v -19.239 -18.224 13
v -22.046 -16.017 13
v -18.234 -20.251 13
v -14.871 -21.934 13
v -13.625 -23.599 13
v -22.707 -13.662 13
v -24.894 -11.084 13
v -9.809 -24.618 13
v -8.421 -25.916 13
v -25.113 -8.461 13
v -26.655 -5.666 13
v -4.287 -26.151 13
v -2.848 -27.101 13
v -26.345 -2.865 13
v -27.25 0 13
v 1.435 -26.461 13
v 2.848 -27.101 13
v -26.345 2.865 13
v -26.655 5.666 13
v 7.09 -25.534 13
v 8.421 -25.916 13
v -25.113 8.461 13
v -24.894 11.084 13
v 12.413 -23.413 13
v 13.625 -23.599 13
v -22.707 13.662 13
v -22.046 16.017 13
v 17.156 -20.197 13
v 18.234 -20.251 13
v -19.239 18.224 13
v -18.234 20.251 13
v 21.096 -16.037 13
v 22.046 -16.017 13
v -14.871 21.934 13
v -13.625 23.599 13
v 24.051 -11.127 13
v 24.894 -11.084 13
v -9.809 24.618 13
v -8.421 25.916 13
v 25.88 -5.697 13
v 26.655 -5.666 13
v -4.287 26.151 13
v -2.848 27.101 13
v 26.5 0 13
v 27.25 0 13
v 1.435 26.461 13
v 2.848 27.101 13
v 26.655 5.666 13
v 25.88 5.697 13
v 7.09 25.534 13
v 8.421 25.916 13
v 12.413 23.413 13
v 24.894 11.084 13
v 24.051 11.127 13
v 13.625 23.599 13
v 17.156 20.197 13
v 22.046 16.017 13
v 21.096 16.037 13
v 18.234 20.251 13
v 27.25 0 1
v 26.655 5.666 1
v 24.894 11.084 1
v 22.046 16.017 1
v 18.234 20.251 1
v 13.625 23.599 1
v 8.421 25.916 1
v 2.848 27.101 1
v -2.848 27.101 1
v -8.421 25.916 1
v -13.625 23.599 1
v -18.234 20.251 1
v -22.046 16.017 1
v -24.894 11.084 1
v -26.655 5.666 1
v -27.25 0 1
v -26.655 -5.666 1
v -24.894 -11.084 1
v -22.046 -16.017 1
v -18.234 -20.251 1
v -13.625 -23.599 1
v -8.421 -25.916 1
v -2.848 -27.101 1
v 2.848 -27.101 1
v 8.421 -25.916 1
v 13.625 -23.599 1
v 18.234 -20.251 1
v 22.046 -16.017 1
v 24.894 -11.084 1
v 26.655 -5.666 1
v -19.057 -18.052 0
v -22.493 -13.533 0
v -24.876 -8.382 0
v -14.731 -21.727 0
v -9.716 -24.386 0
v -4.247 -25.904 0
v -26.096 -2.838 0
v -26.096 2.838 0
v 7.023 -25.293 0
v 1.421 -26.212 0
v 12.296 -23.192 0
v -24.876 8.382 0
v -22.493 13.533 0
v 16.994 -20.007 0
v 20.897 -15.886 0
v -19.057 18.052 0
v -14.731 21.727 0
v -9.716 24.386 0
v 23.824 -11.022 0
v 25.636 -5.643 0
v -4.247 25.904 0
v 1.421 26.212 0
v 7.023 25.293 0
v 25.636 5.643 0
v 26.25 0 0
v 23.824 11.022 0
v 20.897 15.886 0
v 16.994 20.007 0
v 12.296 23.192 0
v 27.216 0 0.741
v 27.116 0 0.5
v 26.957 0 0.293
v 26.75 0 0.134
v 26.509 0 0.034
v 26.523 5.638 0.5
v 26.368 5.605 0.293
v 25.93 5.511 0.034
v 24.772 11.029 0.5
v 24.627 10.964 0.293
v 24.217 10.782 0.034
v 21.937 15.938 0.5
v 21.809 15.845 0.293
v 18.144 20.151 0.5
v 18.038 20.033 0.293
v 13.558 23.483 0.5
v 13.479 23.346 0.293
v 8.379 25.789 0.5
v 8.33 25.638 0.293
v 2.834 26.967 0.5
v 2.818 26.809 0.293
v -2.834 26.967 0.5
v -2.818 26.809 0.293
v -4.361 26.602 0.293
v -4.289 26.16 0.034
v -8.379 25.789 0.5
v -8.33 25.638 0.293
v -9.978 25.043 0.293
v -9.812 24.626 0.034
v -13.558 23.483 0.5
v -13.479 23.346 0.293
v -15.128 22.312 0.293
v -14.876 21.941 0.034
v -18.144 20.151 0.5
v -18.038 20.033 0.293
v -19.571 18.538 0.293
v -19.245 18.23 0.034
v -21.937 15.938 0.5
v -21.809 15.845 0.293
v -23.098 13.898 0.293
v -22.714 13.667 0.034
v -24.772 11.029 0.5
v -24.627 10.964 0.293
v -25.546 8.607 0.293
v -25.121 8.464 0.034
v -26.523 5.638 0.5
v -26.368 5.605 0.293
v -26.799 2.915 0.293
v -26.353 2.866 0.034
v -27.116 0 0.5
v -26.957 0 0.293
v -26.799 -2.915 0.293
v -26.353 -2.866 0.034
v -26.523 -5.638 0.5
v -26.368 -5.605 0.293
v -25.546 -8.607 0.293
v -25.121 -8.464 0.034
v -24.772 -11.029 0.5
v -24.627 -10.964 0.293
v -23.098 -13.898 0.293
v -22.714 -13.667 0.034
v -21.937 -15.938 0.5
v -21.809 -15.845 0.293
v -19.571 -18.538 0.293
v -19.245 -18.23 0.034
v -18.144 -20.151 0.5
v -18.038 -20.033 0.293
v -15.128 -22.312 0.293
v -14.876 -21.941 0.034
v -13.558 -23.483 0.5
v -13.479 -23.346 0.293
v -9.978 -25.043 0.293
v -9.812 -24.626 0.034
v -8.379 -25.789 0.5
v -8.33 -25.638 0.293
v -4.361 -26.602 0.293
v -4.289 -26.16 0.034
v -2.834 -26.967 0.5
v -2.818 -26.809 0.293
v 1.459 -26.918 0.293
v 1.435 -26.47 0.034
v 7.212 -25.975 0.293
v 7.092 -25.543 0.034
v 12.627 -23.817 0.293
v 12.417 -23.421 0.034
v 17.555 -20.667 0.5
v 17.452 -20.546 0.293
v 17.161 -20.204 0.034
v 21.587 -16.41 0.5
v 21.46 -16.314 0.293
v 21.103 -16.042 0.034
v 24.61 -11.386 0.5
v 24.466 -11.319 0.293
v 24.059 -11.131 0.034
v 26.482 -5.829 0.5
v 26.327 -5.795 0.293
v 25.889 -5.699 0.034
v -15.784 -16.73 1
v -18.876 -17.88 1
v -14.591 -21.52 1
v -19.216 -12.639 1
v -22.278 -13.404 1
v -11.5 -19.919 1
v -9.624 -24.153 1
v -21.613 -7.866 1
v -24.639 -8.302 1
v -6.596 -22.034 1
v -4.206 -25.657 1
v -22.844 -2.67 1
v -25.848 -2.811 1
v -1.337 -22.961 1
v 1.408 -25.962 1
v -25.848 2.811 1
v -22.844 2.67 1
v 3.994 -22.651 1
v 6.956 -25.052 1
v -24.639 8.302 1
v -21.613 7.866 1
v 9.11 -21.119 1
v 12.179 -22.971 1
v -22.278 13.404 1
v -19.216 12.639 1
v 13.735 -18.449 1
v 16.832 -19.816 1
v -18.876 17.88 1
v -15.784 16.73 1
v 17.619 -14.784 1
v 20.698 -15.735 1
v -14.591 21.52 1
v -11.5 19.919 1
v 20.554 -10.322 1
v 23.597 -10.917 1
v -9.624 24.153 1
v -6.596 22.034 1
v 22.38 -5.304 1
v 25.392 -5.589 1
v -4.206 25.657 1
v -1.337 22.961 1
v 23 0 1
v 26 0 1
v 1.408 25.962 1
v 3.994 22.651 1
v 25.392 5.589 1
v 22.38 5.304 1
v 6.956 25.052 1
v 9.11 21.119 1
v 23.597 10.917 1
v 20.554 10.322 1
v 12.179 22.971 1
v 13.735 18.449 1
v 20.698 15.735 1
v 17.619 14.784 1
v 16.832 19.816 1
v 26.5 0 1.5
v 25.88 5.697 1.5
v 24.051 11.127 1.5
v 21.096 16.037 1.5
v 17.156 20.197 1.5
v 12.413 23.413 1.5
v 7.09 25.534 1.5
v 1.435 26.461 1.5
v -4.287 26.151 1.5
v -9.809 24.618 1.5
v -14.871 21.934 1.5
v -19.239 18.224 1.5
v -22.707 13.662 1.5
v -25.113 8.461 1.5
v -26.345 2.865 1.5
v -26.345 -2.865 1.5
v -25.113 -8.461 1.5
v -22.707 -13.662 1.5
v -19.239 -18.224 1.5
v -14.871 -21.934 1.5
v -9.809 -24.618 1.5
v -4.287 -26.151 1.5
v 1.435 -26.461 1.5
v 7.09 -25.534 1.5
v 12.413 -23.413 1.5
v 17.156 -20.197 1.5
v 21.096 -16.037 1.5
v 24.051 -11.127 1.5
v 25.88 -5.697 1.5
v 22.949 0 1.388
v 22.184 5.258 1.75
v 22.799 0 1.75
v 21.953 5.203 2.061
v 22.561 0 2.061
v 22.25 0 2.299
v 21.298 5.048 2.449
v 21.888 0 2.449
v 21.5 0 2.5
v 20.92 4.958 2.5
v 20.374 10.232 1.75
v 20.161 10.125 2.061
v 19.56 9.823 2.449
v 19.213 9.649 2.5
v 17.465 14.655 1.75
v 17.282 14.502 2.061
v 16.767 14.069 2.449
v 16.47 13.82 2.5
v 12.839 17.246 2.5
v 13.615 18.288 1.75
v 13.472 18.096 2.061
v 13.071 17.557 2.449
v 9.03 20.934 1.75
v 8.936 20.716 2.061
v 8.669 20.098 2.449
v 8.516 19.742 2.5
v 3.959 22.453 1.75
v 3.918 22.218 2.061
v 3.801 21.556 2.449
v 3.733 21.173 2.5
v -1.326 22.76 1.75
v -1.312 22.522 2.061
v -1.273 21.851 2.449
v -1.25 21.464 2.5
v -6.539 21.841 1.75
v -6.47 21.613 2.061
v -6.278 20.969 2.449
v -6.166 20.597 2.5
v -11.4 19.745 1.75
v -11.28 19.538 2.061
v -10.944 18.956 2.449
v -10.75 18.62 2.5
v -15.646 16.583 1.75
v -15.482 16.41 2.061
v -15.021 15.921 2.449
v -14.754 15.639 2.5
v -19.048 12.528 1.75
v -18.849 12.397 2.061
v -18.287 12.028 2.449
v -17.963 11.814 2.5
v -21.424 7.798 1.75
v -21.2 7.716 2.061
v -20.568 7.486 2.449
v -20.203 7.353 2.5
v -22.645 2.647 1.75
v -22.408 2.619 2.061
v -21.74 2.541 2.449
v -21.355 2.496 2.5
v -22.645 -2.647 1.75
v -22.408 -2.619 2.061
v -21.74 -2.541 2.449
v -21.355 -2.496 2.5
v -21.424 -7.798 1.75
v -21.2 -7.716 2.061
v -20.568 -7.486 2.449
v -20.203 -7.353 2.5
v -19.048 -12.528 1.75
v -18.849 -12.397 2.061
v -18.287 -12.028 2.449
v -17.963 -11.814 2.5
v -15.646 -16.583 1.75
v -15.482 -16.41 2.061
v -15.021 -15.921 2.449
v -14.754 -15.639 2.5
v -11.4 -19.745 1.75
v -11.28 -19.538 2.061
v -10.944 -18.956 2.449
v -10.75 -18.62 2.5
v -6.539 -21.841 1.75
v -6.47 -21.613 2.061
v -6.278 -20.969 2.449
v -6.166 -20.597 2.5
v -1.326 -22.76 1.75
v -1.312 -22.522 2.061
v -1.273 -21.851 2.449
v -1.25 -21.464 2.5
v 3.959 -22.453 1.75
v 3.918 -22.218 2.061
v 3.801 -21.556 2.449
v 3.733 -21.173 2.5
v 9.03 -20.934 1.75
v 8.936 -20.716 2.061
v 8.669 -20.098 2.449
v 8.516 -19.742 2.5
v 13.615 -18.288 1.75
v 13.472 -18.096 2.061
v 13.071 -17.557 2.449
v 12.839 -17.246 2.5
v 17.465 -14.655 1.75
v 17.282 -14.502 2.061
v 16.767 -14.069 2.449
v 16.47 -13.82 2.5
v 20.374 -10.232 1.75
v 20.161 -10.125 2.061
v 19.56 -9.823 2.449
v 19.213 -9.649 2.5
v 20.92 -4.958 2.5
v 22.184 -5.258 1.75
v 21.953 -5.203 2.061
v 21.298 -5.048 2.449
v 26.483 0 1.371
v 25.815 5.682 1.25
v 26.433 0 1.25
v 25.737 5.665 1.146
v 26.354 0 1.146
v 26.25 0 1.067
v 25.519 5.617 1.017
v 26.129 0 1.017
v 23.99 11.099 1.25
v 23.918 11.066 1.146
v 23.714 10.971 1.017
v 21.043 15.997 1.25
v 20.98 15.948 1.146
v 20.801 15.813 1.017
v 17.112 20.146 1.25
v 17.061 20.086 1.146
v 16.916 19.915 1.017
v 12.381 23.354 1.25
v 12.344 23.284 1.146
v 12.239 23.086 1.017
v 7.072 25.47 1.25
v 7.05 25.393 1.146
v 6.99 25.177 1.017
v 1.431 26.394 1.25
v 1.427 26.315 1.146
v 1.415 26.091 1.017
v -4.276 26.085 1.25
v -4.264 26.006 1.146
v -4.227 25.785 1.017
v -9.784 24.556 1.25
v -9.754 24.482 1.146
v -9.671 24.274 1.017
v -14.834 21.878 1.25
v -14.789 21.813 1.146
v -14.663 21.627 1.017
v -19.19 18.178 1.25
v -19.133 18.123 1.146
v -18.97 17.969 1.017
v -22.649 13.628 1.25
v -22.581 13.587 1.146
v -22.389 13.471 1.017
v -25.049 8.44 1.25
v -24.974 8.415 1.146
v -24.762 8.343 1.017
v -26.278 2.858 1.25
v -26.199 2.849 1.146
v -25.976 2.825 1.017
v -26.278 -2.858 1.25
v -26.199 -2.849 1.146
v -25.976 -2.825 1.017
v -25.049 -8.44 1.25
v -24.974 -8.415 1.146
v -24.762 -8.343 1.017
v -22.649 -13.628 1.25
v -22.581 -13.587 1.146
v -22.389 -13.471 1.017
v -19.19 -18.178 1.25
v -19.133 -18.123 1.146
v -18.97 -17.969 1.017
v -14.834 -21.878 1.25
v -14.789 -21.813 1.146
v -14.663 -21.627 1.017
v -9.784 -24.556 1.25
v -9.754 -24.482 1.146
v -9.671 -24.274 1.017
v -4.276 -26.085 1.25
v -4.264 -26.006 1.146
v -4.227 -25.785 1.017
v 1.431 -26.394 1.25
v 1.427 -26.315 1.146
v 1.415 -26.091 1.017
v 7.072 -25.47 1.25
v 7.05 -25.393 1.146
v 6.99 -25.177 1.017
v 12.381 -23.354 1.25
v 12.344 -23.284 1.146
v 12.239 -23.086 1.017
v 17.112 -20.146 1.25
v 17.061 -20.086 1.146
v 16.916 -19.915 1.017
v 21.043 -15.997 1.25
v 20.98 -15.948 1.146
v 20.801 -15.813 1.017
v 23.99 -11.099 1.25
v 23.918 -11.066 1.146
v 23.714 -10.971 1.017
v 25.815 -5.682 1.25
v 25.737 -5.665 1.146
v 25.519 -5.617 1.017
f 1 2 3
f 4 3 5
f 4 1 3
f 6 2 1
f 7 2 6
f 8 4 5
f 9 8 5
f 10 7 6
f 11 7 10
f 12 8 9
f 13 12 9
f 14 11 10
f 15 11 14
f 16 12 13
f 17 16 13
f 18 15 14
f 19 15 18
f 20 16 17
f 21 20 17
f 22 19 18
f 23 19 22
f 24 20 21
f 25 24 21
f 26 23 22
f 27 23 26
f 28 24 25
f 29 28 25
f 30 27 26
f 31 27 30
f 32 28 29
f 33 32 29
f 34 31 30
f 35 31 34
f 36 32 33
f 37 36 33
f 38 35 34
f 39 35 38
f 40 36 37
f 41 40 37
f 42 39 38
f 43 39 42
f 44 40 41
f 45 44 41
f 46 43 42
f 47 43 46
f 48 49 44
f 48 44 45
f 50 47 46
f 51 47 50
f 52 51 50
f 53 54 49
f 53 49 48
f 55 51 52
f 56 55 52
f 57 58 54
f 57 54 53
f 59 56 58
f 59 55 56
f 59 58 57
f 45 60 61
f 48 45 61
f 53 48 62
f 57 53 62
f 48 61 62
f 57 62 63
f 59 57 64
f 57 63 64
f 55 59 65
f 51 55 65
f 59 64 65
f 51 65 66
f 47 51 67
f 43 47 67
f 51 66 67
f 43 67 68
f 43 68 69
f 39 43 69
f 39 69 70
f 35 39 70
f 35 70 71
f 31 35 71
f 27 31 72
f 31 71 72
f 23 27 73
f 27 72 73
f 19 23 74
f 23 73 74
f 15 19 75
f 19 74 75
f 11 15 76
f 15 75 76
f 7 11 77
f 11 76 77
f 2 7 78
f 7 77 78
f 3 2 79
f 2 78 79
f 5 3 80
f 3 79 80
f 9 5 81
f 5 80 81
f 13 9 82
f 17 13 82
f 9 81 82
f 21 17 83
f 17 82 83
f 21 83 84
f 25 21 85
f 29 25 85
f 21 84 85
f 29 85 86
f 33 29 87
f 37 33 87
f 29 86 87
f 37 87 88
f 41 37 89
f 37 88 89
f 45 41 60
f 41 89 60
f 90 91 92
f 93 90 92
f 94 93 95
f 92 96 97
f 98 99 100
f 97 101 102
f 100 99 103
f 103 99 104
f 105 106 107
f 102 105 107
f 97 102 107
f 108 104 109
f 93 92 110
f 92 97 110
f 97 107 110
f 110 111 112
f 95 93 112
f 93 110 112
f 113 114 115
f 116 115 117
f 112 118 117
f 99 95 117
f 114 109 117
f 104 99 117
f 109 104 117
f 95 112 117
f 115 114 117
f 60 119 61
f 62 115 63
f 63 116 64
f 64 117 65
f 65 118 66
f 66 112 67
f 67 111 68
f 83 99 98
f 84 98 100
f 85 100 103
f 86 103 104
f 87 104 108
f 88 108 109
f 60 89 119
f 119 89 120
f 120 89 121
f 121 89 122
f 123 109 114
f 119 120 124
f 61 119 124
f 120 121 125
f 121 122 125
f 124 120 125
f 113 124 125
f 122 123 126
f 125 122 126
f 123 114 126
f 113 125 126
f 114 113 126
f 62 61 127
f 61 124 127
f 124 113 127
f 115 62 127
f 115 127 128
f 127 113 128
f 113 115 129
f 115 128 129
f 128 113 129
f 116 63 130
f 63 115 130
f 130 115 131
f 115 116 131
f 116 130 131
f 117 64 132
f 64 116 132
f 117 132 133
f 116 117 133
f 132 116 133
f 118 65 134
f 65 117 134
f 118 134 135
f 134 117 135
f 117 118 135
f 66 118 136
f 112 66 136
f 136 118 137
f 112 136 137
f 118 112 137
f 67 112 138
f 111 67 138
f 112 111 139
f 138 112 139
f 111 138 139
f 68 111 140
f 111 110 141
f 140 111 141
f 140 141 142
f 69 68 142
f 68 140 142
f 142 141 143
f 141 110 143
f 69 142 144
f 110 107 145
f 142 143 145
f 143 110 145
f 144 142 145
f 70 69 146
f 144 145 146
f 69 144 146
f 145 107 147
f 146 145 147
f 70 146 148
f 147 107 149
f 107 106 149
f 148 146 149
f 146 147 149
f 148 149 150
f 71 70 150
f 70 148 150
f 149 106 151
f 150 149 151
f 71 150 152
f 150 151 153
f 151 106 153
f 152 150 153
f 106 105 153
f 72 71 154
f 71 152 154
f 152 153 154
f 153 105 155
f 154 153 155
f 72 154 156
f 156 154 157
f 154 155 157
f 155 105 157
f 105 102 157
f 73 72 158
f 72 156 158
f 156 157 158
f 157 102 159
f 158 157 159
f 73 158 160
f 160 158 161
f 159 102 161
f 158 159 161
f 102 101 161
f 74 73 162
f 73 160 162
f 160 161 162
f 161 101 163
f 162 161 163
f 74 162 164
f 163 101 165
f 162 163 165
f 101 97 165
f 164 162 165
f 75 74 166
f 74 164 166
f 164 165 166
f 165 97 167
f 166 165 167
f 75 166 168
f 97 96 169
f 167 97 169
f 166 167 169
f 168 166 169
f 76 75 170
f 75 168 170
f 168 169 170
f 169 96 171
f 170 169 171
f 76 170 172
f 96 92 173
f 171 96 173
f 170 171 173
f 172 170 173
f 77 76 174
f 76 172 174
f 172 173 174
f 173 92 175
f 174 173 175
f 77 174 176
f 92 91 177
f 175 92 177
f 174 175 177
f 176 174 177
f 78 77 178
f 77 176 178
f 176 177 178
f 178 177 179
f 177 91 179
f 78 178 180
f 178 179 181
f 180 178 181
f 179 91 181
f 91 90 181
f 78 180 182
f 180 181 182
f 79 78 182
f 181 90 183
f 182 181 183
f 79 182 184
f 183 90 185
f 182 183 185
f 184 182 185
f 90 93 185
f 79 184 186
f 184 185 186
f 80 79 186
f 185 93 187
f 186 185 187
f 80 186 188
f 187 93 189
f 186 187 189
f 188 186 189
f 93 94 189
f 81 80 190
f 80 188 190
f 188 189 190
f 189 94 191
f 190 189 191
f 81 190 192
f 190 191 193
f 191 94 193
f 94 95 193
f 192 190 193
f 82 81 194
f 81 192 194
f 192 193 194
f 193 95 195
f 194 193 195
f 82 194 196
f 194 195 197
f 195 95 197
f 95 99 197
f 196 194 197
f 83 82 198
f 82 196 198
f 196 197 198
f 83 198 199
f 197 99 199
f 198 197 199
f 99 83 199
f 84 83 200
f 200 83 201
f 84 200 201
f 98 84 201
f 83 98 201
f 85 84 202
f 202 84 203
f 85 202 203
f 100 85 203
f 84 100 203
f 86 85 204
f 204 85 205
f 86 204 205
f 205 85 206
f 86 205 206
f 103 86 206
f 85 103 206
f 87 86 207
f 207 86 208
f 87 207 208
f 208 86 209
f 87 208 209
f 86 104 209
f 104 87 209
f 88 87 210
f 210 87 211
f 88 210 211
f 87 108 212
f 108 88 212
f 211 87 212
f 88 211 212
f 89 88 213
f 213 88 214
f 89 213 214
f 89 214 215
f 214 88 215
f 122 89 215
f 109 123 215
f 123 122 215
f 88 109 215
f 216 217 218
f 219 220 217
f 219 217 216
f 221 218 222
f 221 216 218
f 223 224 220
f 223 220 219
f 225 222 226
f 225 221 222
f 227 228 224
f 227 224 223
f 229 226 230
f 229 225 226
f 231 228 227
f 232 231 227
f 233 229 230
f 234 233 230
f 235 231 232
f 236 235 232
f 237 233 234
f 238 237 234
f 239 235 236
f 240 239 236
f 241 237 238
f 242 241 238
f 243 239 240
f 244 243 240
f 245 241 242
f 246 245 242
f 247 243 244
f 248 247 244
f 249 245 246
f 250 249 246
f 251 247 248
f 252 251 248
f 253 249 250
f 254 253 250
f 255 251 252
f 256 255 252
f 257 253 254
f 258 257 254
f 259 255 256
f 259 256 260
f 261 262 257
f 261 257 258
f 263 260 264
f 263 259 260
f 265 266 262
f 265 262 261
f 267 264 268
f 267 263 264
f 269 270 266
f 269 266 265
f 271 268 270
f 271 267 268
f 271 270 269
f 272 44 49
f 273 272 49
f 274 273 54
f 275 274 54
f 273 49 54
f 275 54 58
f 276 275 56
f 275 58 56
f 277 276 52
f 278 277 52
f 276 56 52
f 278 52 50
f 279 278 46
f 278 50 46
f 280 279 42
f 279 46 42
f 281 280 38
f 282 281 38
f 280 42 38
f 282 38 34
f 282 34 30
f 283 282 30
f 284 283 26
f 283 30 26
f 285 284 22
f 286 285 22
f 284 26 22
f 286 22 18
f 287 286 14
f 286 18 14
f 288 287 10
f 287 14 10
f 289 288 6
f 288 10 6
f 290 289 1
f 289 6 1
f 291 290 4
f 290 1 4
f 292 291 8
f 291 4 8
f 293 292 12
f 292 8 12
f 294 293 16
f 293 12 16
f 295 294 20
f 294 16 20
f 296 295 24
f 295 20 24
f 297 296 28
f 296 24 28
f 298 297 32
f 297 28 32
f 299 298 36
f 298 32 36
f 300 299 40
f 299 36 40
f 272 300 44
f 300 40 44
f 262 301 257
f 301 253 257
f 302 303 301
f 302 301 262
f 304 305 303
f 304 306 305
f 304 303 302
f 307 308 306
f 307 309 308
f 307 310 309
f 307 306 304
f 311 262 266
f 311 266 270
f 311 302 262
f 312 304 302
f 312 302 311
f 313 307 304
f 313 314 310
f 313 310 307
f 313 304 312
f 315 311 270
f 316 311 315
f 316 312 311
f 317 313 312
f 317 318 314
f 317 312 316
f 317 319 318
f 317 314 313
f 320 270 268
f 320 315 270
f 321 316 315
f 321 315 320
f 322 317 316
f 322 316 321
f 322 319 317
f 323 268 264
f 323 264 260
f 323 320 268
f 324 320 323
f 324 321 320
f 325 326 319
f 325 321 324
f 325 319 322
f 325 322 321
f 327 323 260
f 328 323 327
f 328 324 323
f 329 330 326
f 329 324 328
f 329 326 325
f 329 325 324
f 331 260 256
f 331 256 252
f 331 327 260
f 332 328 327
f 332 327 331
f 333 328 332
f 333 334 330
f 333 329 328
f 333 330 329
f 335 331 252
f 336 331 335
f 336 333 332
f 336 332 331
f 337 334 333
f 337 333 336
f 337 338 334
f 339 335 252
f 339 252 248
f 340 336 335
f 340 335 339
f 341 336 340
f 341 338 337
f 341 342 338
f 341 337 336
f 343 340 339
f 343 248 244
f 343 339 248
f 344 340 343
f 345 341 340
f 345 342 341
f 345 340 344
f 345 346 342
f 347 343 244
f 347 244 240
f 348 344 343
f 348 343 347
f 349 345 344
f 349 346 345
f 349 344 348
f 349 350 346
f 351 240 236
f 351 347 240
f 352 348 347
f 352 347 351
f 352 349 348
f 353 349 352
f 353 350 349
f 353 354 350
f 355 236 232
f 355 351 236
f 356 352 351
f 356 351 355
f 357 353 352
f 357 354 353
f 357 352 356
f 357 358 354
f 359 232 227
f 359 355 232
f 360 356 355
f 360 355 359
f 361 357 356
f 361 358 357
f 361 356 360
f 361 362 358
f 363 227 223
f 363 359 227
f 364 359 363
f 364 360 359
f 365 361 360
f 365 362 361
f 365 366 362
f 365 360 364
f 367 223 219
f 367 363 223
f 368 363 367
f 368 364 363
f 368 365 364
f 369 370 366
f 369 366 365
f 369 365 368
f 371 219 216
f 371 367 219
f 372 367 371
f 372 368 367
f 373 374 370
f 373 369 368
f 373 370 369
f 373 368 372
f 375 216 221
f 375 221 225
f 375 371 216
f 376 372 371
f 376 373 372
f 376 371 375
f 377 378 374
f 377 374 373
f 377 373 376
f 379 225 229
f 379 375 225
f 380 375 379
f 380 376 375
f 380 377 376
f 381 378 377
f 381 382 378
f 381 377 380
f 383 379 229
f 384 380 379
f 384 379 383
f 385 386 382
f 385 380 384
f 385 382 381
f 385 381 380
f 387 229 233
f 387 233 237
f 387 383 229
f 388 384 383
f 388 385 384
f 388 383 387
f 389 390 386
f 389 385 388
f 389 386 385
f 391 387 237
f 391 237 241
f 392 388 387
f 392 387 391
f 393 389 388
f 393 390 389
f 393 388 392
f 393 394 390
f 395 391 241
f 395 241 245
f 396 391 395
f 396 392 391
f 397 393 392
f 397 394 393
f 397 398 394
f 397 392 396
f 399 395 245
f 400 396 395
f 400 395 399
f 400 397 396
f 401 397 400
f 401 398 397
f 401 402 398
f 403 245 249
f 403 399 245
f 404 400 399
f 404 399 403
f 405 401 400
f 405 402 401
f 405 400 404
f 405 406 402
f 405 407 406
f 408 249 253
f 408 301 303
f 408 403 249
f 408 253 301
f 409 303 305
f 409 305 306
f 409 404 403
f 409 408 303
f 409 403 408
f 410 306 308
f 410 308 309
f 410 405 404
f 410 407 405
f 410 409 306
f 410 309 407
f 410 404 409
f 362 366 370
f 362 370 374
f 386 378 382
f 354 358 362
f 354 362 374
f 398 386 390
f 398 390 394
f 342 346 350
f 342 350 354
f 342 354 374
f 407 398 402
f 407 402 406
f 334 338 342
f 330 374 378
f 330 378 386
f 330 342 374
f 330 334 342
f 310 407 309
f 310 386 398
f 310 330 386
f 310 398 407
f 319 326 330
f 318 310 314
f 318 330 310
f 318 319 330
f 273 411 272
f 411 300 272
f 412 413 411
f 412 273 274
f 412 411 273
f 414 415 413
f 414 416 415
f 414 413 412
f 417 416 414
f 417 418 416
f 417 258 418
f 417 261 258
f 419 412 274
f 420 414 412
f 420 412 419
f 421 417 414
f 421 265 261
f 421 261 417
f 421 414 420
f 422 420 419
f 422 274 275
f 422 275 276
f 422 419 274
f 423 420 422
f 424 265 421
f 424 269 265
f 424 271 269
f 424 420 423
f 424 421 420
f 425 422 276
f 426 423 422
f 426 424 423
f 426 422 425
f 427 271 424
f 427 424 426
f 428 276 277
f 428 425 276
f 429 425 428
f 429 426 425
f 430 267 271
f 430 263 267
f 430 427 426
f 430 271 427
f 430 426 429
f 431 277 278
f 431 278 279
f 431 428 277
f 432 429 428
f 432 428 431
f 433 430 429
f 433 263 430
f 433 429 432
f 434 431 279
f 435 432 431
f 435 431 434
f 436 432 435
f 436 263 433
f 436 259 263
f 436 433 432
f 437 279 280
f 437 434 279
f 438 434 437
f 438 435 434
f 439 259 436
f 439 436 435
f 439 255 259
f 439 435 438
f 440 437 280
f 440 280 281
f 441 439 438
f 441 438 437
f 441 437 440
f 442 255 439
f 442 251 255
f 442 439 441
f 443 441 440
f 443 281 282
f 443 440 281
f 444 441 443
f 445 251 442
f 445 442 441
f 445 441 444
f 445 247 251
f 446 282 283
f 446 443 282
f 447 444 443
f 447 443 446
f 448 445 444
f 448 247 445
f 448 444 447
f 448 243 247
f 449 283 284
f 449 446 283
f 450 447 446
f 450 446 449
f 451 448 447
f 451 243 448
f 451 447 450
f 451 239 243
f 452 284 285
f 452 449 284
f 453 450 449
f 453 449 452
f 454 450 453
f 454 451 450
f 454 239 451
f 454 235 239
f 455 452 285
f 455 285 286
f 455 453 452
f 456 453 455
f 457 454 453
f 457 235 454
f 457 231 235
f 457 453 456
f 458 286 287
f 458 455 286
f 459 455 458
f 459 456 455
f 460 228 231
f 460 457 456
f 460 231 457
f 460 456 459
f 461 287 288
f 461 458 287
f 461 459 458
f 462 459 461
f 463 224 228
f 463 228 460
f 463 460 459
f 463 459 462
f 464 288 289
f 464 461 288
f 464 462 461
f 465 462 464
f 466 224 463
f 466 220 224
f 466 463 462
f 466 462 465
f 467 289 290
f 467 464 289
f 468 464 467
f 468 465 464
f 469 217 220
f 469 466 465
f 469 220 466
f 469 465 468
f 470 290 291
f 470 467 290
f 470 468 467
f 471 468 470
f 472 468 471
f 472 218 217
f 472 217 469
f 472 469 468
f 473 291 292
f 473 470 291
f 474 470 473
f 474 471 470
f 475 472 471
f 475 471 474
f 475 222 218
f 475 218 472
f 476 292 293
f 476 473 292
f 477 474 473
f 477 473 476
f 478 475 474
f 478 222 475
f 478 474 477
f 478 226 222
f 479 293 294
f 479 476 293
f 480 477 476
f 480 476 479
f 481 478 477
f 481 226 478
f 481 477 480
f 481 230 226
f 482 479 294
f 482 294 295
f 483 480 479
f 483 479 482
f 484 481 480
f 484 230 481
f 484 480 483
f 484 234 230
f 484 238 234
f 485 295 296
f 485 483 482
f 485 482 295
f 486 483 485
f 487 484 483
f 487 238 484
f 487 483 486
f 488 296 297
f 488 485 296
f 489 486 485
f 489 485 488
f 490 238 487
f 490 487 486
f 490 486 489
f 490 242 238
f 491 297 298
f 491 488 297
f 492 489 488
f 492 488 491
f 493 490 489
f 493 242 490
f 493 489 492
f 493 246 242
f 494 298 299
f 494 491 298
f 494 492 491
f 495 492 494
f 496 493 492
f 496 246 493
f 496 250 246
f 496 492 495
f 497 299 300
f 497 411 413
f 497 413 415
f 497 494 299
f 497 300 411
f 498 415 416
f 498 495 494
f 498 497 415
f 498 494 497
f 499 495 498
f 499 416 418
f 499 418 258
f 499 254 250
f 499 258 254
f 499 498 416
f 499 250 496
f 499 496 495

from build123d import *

# Parameters (mm, degrees)
F0_R     = 27.25
F1_DEPTH = 13
F2_R     = 26.5
F3_DEPTH = 12
F4_R     = 23
F5_DEPTH = 1.5
F6_R     = 1.49999
F7_R     = 1
F8_R     = 0.5


# Not quite as in the source:
# - a fillet or chamfer is up to 0.001 mm smaller than in the source, because OpenCascade refuses the exact size


with BuildPart() as f1:
    # F0 (on Top) → F1 (new body)
    with BuildSketch(Plane.XY):
        Circle(F0_R)
    extrude(amount=F1_DEPTH)

    # F2 (on face) → F3 (cut)
    with BuildSketch(Plane.XY.offset(13)):
        Circle(F2_R)
    extrude(amount=-F3_DEPTH, mode=Mode.SUBTRACT)

    # F4 (on face) → F5 (join)
    with BuildSketch(Plane.XY.offset(1)):
        Circle(F4_R)
    extrude(amount=F5_DEPTH)

    # F6 (radius 1.5 in the source; OpenCascade refuses exactly that, so slightly less here)
    f6_edges = [f1.edges().sort_by_distance(p)[0] for p in [
        (-23, 0, 2.5),
    ]]
    fillet(f6_edges, radius=F6_R)

    # F7
    f7_edges = [f1.edges().sort_by_distance(p)[0] for p in [
        (-27.25, 0, 0),
    ]]
    fillet(f7_edges, radius=F7_R)

    # F8
    f8_edges = [f1.edges().sort_by_distance(p)[0] for p in [
        (-26.5, 0, 1),
    ]]
    fillet(f8_edges, radius=F8_R)


solid = f1.part
